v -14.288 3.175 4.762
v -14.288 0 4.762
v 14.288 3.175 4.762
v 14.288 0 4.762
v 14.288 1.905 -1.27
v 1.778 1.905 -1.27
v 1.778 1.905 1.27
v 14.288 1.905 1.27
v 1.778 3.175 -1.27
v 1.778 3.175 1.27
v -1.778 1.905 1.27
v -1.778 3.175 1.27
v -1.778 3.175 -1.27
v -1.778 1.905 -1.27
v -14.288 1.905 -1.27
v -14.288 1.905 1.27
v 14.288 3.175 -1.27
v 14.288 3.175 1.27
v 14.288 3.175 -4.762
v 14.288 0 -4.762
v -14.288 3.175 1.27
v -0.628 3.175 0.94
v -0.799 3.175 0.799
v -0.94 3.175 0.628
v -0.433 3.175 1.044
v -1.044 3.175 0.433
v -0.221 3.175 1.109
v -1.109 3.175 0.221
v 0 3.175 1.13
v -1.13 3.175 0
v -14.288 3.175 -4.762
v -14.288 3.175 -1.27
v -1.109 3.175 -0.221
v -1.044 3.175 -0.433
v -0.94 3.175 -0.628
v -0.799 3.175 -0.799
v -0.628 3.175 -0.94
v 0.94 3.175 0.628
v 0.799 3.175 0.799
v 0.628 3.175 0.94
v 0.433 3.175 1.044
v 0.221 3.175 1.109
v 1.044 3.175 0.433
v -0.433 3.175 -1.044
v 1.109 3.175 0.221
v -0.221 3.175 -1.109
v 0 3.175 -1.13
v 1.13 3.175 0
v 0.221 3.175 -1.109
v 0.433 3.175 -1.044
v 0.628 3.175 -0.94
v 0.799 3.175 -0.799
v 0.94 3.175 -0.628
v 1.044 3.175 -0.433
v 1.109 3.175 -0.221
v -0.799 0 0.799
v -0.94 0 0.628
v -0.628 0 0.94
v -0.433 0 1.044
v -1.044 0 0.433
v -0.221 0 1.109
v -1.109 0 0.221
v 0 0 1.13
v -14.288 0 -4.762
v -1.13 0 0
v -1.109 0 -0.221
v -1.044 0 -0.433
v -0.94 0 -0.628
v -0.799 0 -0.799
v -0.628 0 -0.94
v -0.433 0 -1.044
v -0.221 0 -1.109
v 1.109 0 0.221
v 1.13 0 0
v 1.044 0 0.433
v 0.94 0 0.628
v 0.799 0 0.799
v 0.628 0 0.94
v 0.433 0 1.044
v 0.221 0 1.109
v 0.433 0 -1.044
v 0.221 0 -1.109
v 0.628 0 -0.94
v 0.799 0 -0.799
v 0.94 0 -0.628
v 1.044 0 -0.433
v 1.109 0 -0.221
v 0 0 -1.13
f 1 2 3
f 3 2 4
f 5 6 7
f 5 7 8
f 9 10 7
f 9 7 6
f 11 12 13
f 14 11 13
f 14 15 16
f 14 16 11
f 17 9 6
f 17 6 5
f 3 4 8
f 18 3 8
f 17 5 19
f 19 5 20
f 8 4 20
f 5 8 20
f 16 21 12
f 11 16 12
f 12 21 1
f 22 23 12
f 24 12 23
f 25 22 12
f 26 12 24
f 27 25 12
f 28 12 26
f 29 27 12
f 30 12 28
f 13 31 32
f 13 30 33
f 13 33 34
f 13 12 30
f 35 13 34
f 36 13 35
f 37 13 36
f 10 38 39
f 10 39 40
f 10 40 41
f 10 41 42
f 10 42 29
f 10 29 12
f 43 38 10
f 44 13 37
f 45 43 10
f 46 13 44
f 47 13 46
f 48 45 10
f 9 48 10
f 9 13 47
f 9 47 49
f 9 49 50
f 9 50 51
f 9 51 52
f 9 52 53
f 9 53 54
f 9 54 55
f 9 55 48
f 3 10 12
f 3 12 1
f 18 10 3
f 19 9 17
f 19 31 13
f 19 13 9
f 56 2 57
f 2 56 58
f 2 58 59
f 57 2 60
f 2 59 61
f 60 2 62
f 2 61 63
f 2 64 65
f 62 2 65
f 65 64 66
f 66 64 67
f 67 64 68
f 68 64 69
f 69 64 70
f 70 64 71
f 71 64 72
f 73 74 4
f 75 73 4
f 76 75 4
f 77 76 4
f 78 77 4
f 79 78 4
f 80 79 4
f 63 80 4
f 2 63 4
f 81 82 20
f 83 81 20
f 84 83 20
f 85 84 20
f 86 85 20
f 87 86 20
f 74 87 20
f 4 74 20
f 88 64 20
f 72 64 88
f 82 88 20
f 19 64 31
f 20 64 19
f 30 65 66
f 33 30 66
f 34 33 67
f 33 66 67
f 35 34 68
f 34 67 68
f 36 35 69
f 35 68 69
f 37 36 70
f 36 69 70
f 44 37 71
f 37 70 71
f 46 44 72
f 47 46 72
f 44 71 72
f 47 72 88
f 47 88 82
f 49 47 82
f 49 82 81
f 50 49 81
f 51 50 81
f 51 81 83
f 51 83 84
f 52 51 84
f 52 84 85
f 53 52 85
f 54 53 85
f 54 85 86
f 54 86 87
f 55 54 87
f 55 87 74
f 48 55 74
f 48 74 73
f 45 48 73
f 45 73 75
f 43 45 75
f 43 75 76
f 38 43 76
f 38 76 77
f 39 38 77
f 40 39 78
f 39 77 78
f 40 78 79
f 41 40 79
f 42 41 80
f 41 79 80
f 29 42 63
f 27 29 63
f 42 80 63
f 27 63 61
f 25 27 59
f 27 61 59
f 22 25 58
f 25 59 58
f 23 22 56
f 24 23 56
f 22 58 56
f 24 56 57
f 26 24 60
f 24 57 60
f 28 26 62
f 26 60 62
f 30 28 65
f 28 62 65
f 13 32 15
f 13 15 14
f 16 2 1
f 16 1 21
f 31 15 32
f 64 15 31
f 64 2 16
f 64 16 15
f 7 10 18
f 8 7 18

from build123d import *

# Parameters (mm, degrees)
SKETCH1_W                 = 28.575
SKETCH1_H                 = 9.525
BOSS_EXTRUDE1_DEPTH       = 3.175
F_4_40_TAPPED_HOLE1_D     = 2.2606
F_4_40_TAPPED_HOLE1_DEPTH = 7.5946
F_4_40_TAPPED_HOLE1_TIP   = 0.679152758
SKETCH5_W                 = 12.5095
SKETCH5_H                 = 2.54
CUT_EXTRUDE2_DEPTH        = 1.27


with BuildPart() as part:
    # Sketch1 → Boss-Extrude1 (new body)
    with BuildSketch(Plane(origin=(0, 0, 0), x_dir=(1, 0, 0), z_dir=(0, 1, 0))):
        Rectangle(SKETCH1_W, SKETCH1_H)
    extrude(amount=BOSS_EXTRUDE1_DEPTH)

    # #4-40 Tapped Hole1
    with Locations(Plane(origin=(0, 3.175, 0), x_dir=(1, 0, 0), z_dir=(0, 1, 0))):
        with Locations((0, 0)):
            Hole(F_4_40_TAPPED_HOLE1_D / 2, depth=F_4_40_TAPPED_HOLE1_DEPTH)
            with Locations((0, 0, -(F_4_40_TAPPED_HOLE1_DEPTH + F_4_40_TAPPED_HOLE1_TIP / 2))):  # 118° drill point
                Cone(0, F_4_40_TAPPED_HOLE1_D / 2, F_4_40_TAPPED_HOLE1_TIP, mode=Mode.SUBTRACT)

    # Sketch5 → Cut-Extrude2 (cut)
    with BuildSketch(Plane(origin=(0, 3.175, 0), x_dir=(1, 0, 0), z_dir=(0, 1, 0))):
        with Locations((-8.03275, 0)):
            Rectangle(SKETCH5_W, SKETCH5_H)
        with Locations((8.03275, 0)):
            Rectangle(SKETCH5_W, SKETCH5_H)
    extrude(amount=-CUT_EXTRUDE2_DEPTH, mode=Mode.SUBTRACT)


solid = part.part
